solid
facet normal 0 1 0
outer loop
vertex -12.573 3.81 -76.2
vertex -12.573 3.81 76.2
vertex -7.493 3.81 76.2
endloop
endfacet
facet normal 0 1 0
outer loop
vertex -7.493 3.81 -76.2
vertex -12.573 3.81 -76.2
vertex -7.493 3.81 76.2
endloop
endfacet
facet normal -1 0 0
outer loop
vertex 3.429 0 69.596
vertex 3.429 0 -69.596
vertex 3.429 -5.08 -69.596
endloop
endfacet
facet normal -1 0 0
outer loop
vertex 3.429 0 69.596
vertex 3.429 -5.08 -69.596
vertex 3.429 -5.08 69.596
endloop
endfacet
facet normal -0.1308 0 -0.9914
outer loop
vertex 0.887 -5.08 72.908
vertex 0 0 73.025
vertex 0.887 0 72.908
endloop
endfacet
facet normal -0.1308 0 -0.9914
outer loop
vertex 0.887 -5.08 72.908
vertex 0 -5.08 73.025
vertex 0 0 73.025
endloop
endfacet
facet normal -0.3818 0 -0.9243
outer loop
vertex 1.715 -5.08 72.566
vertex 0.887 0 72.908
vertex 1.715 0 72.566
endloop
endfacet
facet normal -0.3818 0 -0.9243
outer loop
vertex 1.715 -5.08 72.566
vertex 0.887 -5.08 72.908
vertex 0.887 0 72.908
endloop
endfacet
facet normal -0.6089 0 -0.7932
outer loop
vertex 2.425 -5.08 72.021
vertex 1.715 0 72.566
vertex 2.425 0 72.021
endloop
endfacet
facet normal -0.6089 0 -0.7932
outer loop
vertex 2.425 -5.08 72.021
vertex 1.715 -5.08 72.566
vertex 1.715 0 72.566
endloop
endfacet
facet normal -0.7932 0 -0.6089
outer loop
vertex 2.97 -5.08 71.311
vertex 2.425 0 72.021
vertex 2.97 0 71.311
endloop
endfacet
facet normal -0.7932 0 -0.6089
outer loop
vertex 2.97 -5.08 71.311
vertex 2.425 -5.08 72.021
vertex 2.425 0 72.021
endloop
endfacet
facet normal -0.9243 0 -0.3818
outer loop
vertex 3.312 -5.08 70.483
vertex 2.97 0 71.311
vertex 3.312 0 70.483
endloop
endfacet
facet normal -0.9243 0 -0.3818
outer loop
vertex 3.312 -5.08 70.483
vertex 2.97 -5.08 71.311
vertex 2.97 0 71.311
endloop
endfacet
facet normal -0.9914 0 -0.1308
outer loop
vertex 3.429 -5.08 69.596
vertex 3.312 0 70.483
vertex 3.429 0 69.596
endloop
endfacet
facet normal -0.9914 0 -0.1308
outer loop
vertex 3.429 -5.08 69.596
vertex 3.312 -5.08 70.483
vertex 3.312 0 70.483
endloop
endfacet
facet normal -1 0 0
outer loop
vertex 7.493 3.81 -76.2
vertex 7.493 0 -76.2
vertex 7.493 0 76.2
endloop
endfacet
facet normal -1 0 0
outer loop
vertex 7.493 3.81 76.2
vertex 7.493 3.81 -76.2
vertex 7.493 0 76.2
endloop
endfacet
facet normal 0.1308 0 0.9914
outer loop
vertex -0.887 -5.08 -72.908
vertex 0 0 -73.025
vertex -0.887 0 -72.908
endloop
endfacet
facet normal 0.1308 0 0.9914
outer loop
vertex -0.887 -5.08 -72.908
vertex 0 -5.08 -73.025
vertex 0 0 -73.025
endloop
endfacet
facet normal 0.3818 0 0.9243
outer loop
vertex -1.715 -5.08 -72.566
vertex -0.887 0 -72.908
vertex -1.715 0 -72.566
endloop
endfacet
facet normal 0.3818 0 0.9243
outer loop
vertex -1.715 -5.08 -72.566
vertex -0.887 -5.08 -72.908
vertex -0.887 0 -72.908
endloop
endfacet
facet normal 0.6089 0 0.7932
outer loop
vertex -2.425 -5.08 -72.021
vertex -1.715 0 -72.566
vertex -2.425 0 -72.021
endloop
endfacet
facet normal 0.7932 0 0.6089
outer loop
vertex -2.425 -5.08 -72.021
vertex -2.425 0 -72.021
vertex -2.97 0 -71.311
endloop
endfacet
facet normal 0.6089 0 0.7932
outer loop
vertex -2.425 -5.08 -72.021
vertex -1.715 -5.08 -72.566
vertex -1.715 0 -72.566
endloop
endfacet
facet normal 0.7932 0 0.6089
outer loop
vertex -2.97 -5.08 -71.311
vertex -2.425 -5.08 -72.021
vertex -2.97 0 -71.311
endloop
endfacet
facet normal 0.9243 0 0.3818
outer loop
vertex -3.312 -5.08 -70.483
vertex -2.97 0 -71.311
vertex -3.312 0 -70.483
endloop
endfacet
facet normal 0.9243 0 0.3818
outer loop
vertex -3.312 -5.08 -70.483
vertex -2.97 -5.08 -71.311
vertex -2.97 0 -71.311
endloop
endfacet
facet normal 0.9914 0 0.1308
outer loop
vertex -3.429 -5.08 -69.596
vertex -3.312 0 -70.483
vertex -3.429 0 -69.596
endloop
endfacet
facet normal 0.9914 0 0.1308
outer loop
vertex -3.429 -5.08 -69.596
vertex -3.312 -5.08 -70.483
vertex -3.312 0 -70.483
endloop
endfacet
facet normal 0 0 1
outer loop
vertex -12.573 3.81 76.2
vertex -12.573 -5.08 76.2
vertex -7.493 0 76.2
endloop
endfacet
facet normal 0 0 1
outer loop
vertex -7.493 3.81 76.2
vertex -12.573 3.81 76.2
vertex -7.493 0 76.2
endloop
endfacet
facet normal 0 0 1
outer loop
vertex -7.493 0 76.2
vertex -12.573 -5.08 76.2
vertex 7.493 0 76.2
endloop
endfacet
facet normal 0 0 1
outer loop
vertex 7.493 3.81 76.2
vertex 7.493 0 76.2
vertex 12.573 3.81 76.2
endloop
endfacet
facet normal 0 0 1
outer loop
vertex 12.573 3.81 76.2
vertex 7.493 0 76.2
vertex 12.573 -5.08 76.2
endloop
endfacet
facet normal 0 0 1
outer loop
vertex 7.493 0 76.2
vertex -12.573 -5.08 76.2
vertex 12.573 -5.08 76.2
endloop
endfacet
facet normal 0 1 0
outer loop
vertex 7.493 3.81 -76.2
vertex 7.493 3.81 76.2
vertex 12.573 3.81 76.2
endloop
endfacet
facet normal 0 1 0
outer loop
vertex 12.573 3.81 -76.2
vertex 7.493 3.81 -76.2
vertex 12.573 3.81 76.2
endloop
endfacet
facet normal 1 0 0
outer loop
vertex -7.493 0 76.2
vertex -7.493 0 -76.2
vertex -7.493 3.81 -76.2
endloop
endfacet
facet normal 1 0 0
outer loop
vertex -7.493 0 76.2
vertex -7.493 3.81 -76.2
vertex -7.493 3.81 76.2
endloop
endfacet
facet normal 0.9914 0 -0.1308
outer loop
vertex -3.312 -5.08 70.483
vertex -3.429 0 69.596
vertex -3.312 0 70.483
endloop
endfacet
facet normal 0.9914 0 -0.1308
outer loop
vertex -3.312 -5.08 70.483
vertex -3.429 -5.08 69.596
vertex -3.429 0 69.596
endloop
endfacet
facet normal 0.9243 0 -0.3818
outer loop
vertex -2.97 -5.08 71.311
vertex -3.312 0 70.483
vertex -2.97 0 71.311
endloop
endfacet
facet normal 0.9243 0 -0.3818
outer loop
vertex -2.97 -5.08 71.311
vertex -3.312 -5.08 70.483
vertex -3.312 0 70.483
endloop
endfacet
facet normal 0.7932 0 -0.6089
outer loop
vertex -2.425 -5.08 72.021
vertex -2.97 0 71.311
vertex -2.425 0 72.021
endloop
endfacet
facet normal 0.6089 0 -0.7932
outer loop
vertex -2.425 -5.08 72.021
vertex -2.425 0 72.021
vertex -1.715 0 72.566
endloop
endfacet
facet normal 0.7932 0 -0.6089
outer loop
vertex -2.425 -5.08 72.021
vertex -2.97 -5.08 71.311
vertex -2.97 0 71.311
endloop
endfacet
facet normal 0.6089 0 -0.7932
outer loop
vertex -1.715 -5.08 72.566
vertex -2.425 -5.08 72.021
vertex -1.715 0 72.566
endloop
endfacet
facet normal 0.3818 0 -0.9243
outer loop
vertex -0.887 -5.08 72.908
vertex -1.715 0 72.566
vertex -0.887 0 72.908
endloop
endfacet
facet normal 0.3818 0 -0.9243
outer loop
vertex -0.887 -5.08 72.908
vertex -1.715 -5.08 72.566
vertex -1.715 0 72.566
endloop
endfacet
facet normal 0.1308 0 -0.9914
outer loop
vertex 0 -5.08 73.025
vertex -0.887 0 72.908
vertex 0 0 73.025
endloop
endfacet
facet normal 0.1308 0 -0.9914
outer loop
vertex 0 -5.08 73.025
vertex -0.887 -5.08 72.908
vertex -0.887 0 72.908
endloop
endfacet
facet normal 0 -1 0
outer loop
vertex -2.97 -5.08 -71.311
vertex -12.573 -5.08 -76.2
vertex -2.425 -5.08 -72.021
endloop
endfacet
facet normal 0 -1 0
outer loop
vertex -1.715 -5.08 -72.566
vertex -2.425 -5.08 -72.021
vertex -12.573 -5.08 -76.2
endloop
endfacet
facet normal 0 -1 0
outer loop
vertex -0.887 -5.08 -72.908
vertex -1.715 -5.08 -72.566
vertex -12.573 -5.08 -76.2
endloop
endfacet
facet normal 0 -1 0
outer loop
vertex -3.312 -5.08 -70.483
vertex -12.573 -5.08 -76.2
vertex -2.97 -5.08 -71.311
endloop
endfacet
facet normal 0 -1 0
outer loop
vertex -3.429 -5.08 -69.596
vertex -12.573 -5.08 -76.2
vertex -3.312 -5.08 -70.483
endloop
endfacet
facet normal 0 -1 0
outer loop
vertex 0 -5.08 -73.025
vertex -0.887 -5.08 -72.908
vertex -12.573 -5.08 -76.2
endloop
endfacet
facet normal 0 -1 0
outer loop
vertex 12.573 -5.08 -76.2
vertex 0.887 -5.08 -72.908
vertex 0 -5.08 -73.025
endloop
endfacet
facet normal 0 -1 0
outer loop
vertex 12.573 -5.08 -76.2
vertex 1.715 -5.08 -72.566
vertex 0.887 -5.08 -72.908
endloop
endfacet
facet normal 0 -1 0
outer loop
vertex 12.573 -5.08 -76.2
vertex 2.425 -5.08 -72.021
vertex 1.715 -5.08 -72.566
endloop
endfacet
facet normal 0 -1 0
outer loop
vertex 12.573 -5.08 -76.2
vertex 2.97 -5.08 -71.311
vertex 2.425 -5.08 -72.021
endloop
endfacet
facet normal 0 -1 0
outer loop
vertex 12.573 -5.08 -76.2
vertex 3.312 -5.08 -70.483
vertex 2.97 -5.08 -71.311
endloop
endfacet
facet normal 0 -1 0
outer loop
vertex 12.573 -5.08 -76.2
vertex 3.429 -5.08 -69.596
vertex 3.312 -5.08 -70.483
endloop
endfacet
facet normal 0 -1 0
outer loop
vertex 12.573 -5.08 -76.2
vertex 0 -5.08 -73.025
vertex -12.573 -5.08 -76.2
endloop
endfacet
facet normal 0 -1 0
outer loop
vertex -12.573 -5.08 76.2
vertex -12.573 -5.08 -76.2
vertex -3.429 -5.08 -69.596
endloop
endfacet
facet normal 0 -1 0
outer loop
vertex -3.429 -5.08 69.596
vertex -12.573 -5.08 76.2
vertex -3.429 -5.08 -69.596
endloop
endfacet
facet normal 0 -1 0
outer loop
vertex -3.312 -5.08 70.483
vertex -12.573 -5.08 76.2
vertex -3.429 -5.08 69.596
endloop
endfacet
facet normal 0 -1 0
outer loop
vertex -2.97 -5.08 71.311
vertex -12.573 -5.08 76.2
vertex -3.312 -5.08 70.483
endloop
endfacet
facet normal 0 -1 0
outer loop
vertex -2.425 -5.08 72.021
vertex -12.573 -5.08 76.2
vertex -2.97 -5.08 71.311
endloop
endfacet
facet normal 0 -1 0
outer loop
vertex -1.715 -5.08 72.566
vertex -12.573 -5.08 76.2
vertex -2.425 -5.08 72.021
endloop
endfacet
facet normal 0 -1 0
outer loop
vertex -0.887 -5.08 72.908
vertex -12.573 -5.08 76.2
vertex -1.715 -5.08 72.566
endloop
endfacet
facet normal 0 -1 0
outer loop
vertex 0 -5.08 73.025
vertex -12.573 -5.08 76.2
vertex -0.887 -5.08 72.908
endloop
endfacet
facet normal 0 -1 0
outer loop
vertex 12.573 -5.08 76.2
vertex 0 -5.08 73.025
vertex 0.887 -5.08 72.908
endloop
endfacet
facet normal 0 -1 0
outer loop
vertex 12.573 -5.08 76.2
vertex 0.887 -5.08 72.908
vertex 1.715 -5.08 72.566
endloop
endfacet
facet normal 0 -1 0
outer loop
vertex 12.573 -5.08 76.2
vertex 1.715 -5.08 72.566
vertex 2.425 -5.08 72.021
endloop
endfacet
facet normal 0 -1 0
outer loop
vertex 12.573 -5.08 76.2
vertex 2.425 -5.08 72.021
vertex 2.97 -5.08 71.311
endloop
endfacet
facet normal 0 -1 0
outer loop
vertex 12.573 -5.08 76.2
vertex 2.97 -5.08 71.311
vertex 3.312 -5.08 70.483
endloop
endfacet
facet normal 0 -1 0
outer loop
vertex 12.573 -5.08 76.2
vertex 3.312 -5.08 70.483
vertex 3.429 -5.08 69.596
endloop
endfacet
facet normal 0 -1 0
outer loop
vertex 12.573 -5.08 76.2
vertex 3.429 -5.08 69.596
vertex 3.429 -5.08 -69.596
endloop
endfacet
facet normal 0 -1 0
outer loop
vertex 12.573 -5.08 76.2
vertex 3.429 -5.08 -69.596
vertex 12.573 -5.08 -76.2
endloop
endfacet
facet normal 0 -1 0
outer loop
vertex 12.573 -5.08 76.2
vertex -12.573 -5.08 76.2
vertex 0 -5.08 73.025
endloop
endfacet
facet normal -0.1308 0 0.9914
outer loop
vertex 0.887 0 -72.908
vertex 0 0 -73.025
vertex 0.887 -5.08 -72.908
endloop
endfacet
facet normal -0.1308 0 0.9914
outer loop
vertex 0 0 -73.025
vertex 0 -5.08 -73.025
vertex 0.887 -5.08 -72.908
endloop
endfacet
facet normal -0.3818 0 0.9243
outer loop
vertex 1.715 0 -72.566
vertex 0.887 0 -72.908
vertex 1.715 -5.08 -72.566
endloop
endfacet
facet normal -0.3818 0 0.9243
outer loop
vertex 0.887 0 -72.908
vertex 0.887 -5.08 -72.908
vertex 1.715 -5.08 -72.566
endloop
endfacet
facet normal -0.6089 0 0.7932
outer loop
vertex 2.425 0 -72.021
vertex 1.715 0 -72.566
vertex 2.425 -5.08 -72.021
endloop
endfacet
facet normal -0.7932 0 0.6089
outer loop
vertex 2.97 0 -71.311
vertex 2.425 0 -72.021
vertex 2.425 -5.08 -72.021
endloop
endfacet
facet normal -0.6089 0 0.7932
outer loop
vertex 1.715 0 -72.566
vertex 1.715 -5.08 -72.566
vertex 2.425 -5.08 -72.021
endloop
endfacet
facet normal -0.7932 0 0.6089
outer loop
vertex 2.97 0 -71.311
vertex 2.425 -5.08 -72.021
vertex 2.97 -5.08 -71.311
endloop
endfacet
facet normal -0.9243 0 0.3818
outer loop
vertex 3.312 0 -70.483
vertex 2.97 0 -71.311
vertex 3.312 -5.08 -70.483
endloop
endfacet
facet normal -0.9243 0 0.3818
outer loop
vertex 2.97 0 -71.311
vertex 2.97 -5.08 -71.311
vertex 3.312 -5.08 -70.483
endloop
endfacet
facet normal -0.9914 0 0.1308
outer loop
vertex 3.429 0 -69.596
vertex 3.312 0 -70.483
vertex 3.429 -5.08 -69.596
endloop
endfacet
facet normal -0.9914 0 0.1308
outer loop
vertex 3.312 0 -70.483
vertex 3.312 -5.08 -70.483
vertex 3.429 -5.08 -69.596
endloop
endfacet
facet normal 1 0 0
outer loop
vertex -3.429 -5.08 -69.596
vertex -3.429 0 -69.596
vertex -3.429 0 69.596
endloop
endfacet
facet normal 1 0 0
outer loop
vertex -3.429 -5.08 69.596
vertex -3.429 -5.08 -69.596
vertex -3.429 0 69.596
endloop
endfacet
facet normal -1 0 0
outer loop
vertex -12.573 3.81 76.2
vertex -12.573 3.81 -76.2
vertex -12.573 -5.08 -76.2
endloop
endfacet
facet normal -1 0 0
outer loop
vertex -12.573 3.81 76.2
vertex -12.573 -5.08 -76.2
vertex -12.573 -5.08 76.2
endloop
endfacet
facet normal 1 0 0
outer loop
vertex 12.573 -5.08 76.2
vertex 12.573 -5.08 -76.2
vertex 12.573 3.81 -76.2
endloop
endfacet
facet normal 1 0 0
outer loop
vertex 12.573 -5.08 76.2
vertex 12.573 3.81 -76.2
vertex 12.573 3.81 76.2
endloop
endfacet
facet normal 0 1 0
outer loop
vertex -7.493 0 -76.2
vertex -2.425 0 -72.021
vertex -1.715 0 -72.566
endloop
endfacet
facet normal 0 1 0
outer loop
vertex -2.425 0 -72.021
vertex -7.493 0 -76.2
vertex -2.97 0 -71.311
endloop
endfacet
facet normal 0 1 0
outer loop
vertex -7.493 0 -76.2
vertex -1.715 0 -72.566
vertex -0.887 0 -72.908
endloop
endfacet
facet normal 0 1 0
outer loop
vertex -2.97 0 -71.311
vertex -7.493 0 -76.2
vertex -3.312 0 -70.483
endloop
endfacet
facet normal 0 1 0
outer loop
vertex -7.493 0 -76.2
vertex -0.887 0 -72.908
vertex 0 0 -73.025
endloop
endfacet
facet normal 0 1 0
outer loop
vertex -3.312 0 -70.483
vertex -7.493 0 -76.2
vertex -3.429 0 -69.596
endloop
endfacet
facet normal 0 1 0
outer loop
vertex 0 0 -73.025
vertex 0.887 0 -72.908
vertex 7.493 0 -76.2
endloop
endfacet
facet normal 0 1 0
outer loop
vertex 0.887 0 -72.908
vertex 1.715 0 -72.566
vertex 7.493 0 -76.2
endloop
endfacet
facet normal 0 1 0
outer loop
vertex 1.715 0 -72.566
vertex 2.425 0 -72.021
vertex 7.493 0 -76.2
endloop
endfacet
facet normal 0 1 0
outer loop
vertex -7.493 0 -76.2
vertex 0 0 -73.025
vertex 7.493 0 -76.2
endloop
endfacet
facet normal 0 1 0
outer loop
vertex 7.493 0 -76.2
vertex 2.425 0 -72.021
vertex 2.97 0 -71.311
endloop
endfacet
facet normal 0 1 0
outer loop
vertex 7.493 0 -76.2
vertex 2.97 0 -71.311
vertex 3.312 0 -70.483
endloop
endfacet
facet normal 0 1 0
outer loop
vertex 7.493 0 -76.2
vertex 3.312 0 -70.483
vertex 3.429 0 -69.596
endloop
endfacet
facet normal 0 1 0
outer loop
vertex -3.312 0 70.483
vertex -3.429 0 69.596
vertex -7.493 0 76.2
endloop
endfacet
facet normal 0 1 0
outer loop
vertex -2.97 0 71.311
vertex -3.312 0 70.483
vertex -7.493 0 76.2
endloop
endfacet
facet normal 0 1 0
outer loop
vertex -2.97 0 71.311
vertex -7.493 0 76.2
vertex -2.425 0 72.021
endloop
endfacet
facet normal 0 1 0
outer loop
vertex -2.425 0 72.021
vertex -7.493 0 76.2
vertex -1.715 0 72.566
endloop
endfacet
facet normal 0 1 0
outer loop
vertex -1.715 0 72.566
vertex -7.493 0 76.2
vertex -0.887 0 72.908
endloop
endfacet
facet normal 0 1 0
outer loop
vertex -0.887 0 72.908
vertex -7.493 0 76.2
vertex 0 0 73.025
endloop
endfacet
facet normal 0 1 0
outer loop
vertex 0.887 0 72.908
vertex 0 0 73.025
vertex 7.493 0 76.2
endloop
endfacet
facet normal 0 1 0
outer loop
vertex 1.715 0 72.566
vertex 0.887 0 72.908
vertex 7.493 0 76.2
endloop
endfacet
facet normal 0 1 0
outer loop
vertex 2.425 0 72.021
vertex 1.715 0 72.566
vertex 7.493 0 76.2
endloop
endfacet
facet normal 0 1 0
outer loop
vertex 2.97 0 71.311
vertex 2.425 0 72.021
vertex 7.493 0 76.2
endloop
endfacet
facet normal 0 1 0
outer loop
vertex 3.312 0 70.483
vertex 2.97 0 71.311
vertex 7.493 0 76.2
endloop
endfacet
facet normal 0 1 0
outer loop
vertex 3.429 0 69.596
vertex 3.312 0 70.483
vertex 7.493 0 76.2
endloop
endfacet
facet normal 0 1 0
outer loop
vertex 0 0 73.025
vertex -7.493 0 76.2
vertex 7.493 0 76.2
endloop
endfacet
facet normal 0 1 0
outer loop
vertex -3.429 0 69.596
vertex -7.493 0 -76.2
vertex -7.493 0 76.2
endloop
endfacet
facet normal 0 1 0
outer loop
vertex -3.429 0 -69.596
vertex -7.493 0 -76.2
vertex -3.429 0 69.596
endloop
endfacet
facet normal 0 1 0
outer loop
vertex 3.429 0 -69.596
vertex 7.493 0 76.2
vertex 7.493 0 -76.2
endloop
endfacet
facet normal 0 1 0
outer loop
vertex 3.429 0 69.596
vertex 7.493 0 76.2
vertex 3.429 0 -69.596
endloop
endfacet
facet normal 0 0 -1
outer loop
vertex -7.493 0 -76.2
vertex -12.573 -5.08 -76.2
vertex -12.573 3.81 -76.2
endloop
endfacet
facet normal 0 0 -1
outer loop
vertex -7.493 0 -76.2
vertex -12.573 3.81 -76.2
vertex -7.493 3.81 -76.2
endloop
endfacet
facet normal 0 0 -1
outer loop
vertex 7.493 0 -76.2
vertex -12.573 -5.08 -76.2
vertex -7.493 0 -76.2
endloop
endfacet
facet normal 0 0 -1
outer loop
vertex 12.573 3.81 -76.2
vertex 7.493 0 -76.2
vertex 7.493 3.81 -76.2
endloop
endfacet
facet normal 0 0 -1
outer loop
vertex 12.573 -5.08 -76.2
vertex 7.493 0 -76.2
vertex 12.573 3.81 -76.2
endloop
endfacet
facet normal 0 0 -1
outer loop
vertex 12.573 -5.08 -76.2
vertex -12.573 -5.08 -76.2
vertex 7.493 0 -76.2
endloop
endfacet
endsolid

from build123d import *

# Parameters (mm, degrees)
F0_W     = 14.986
F0_H     = 152.4
F0_W_2   = 6.858
F0_H_2   = 146.05
F0_W_3   = 5.08
F1_DEPTH = 5.08
F2_R     = 3.42899
F3_DEPTH = 3.81


# Not quite as in the source:
# - a fillet or chamfer is up to 0.001 mm smaller than in the source, because OpenCascade refuses the exact size


with BuildPart() as f1:
    # F0 (on Front) → F1 (new body)
    with BuildSketch(Plane.XZ):
        Rectangle(F0_W, F0_H)
        Rectangle(F0_W_2, F0_H_2, mode=Mode.SUBTRACT)
        with Locations((-10.033, 0)):
            Rectangle(F0_W_3, F0_H)
        with Locations((10.033, 0)):
            Rectangle(F0_W_3, F0_H)
    extrude(amount=F1_DEPTH)

    # F2 (radius 3.429 in the source; OpenCascade refuses exactly that, so slightly less here)
    f2_edges = [f1.edges().sort_by_distance(p)[0] for p in [
        (3.429, -2.54, 73.025),
        (-3.429, -2.54, 73.025),
        (-3.429, -2.54, -73.025),
        (3.429, -2.54, -73.025),
    ]]
    fillet(f2_edges, radius=F2_R)

    # F0 (on Front) → F3 (join)
    with BuildSketch(Plane.XZ):
        with Locations((10.033, 0)):
            Rectangle(F0_W_3, F0_H)
        with Locations((-10.033, 0)):
            Rectangle(F0_W_3, F0_H)
    extrude(amount=-F3_DEPTH)


solid = f1.part
